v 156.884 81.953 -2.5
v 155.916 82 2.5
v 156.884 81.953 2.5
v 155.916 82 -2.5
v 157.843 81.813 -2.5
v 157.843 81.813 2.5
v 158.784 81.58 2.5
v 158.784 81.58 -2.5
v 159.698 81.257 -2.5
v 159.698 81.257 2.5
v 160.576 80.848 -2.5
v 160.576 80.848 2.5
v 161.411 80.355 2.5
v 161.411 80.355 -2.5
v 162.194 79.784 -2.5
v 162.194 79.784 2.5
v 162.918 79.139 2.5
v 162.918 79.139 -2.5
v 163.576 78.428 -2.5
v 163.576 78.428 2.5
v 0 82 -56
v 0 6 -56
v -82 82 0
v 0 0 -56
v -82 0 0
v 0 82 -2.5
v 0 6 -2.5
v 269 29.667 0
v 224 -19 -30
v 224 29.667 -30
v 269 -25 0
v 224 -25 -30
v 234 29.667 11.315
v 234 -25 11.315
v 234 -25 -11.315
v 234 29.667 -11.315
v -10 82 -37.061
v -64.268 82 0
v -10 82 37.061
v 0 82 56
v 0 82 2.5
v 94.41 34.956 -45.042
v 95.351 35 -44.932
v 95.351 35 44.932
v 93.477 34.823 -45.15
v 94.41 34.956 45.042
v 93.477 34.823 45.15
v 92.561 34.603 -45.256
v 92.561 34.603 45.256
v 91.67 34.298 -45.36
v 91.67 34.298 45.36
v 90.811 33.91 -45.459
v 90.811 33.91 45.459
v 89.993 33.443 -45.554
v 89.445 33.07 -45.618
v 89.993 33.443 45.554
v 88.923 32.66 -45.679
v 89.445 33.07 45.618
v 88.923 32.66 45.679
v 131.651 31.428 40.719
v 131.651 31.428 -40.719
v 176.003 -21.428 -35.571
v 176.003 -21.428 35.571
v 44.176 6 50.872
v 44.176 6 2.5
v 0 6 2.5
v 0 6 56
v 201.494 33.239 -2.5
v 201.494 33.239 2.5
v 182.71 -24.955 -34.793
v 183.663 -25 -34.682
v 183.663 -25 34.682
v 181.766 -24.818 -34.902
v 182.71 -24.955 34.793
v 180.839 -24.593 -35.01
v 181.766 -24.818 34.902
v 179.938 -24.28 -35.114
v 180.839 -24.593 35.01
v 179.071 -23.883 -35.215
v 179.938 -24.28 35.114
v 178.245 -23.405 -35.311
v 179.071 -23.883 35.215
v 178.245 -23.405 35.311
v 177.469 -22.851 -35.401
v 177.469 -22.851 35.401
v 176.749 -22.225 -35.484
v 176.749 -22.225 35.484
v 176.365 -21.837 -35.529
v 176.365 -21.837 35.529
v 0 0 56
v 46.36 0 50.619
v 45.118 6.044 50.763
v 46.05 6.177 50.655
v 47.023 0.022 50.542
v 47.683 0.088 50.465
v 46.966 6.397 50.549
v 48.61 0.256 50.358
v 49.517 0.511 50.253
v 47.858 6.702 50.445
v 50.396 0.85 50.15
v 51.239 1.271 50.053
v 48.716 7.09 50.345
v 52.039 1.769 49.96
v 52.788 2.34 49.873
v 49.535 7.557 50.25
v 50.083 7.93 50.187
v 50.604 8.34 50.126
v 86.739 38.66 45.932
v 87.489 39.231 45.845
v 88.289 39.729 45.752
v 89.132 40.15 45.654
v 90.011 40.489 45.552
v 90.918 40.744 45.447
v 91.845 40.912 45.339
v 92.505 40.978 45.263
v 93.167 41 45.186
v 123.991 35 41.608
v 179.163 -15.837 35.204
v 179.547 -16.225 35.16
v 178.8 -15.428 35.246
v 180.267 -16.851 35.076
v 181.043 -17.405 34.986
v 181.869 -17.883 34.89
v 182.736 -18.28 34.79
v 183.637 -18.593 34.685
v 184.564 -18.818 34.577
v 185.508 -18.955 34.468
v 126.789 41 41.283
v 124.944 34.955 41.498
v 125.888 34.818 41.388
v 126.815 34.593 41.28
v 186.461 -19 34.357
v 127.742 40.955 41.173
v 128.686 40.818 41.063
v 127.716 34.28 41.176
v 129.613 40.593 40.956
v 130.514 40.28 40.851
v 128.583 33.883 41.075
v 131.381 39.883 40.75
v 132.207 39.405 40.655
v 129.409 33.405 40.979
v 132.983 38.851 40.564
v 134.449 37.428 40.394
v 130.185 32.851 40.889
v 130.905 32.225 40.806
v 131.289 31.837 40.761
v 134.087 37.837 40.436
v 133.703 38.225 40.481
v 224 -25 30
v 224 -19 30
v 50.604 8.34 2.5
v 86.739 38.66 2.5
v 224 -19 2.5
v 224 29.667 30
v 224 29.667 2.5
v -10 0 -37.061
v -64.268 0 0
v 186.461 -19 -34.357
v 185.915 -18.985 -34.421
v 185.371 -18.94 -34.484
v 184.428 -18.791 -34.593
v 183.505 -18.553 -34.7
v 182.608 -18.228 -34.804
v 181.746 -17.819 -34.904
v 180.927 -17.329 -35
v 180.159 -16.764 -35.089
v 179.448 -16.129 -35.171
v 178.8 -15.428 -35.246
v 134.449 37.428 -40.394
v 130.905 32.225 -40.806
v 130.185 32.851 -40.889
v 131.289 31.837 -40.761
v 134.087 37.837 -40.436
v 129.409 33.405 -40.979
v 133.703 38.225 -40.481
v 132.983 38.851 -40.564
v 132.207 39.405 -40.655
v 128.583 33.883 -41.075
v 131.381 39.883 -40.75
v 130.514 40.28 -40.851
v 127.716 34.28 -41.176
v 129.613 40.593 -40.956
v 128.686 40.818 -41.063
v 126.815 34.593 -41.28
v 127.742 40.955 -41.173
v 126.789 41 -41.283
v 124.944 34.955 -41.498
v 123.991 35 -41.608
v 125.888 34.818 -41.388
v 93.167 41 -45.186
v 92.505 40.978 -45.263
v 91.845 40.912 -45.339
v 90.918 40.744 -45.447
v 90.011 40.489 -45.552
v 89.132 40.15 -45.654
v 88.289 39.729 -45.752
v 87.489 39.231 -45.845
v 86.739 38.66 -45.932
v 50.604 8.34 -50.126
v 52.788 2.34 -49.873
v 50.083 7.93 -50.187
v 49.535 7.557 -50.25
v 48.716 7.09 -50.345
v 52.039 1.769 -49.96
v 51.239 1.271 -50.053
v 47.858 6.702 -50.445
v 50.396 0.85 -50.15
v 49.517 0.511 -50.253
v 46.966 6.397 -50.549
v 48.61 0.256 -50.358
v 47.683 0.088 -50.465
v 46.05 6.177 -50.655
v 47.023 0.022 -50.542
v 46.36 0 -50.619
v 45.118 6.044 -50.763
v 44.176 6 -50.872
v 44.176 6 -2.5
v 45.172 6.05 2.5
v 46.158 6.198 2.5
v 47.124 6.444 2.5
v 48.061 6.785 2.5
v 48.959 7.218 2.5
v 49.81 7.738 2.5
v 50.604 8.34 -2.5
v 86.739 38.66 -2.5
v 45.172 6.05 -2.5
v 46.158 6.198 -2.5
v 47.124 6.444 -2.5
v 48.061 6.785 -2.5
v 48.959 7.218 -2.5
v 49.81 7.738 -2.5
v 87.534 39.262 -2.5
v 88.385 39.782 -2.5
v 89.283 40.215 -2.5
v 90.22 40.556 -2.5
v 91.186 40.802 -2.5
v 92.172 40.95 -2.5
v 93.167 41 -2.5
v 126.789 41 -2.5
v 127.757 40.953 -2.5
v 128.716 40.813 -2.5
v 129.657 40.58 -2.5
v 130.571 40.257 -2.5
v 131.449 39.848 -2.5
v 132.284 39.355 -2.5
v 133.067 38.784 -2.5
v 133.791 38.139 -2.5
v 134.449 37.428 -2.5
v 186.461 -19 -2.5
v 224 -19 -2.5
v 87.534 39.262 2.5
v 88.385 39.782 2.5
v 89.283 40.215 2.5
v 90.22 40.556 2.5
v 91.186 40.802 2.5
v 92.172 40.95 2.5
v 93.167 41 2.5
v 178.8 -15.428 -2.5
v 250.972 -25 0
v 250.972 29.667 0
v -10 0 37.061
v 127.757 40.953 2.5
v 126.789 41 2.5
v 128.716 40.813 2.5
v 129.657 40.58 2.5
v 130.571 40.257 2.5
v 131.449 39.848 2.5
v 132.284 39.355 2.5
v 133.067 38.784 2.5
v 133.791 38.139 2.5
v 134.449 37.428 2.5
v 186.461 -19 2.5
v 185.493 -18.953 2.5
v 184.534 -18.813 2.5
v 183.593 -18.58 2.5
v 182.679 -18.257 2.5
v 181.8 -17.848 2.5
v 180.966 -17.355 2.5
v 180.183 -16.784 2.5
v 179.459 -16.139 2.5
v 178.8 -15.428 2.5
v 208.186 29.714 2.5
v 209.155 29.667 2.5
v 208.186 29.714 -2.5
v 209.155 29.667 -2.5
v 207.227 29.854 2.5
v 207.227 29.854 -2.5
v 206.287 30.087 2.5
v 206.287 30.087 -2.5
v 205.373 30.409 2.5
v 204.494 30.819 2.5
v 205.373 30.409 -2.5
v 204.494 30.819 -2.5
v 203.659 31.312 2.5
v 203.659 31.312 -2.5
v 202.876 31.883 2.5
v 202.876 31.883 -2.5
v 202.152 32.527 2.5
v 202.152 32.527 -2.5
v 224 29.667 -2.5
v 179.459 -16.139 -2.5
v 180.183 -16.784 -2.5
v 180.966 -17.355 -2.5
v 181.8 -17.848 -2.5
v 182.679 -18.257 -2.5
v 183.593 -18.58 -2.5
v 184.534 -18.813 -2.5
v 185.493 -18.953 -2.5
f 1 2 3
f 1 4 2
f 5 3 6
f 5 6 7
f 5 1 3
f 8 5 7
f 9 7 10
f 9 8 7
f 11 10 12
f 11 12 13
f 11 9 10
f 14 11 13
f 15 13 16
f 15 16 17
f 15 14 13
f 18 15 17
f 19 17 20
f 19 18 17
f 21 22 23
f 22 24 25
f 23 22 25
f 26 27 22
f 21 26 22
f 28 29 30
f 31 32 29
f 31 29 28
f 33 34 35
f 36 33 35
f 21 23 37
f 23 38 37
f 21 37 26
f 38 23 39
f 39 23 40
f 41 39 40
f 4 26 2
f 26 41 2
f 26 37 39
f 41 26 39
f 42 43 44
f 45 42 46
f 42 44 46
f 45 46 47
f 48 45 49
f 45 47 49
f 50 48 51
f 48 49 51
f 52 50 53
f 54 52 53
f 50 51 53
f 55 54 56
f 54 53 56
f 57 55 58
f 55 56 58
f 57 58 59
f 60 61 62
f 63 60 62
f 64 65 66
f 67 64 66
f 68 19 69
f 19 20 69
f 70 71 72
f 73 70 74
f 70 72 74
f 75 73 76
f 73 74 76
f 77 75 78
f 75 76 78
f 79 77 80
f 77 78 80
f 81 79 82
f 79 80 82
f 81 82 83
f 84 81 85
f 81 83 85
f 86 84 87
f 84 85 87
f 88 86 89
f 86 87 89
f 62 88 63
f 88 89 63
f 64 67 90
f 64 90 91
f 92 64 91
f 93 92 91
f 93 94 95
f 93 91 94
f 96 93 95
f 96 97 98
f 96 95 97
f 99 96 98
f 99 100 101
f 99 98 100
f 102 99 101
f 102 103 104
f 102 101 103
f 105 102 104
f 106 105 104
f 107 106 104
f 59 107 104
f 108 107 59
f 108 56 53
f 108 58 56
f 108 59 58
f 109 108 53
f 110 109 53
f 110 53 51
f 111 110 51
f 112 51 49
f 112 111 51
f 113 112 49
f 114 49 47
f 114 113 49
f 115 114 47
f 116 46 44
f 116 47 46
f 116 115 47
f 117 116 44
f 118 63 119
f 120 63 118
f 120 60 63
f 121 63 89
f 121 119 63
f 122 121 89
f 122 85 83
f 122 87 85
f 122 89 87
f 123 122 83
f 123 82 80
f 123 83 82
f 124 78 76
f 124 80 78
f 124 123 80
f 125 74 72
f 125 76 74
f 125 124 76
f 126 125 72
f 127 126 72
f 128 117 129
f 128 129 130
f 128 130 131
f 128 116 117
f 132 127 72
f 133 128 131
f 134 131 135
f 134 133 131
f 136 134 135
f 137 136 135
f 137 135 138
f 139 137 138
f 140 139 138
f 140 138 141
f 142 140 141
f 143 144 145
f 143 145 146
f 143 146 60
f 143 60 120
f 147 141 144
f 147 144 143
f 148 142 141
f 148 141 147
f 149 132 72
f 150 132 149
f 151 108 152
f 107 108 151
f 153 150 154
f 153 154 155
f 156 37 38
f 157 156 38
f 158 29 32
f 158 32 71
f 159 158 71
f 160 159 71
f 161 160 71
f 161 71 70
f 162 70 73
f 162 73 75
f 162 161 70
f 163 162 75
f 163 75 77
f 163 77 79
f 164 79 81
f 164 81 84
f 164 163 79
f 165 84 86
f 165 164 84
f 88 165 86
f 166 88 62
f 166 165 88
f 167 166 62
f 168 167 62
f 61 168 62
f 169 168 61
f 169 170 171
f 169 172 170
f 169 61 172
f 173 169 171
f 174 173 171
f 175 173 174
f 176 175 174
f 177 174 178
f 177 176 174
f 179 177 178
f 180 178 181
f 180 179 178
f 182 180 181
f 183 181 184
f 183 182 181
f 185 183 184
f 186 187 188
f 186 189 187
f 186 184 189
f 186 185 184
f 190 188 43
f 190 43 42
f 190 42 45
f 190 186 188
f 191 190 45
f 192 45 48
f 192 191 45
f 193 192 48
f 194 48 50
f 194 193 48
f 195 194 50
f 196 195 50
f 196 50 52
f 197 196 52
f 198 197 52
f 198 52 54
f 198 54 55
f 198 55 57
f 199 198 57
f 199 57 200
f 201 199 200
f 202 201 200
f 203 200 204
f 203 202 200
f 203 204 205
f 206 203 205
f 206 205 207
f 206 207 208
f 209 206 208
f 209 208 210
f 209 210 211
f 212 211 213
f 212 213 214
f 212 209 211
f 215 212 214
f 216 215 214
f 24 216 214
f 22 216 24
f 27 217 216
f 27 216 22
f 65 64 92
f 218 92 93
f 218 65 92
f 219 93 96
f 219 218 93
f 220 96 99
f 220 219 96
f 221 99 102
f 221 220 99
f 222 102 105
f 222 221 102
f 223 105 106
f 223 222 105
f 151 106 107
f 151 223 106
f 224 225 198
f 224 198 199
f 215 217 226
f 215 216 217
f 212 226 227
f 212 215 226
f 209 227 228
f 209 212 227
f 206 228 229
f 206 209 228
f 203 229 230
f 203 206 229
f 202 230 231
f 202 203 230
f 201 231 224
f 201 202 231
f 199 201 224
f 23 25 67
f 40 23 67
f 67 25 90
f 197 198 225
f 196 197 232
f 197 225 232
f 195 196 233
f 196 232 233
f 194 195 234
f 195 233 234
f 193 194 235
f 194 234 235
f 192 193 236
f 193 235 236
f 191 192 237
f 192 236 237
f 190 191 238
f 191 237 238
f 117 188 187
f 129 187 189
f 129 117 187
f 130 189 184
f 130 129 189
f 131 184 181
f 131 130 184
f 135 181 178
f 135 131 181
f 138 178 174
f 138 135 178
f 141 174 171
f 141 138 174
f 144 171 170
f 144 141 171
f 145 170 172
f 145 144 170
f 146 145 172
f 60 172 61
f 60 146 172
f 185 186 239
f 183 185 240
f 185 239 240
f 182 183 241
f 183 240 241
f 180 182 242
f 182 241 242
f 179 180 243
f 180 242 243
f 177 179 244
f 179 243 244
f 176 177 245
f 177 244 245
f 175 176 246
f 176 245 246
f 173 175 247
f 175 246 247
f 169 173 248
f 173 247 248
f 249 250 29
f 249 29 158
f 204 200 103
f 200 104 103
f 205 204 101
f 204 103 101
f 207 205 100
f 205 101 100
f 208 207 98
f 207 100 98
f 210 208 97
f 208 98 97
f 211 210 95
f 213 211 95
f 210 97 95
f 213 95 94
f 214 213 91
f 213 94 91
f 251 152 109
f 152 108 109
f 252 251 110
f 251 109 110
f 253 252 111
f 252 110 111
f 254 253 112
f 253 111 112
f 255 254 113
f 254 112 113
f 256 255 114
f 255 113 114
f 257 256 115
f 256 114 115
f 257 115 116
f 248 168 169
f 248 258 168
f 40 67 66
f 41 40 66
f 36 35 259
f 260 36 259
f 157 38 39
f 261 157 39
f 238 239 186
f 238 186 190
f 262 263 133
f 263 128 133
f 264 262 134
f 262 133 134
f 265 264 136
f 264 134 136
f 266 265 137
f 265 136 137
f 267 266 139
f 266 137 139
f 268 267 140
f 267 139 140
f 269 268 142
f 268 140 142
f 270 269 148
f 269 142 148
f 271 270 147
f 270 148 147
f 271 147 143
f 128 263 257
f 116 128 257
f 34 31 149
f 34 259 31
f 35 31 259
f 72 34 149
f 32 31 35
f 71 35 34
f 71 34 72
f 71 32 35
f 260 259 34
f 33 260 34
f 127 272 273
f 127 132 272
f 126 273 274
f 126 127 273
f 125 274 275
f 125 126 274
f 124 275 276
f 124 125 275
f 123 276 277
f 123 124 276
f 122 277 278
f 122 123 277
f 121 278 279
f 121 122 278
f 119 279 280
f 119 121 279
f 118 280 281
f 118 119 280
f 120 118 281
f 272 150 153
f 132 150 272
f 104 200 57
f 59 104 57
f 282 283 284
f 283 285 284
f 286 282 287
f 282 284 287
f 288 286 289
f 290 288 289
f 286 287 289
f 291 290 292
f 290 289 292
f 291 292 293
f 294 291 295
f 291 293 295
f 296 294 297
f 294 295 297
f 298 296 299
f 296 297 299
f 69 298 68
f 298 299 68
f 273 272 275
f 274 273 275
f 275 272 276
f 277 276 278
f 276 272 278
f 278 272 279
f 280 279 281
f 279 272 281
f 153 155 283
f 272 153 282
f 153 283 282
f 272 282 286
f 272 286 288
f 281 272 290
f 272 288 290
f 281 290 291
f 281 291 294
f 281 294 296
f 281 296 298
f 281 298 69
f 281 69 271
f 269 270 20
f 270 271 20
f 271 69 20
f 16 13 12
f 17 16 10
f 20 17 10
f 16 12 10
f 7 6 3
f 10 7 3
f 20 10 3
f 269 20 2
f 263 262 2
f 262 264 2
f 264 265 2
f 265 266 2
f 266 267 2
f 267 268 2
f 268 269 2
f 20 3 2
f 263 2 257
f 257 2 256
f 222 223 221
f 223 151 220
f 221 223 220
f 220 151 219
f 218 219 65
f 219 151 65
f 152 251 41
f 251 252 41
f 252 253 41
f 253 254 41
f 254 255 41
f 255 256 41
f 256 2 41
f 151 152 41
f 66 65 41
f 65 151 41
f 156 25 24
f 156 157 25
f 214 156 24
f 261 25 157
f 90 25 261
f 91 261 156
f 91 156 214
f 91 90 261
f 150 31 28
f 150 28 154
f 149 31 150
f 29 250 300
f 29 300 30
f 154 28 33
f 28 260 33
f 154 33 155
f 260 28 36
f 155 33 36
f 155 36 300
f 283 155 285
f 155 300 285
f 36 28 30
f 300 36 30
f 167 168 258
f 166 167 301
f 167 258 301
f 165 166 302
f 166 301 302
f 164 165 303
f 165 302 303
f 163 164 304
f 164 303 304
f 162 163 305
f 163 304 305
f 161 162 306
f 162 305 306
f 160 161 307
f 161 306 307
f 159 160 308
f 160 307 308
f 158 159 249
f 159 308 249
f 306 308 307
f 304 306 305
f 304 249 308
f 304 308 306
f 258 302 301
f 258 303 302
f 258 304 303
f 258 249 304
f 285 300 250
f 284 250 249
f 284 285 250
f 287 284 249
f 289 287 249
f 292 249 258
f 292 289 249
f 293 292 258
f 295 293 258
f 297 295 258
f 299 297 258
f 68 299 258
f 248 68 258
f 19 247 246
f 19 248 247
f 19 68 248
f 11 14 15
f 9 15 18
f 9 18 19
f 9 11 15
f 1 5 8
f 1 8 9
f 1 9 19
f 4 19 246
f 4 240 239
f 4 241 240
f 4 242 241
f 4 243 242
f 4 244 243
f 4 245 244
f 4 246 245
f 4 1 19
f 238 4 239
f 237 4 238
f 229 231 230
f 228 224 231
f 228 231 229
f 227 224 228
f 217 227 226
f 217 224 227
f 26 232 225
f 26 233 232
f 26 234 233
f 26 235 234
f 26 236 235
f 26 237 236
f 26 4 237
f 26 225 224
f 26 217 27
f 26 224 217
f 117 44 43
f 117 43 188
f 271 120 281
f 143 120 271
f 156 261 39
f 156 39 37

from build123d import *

# Parameters (mm, degrees)
BOSS_EXTRUDE1_DEPTH     = 82
BOSS_EXTRUDE2_DEPTH     = 56
BOSS_EXTRUDE3_START     = -25
BOSS_EXTRUDE3_DEPTH     = 54.666666667
BOSS_EXTRUDE4_DEPTH     = 2.5
CUT_EXTRUDE2_DEPTH      = 83
CUT_EXTRUDE2_DEPTH_BACK = 26
FILLET1_R               = 10


with BuildPart() as part:
    # Sketch2 → Boss-Extrude1 (new body)
    with BuildSketch(Plane(origin=(0, 0, 0), x_dir=(1, 0, 0), z_dir=(0, 1, 0))):
        Polygon((0, -56), (0, 56), (-82, 0), align=None)
        Polygon((-10, 37.0612765), (-64.268297732, 0), (-10, -37.0612765), align=None, mode=Mode.SUBTRACT)
    extrude(amount=BOSS_EXTRUDE1_DEPTH)

    # Sketch3 → Boss-Extrude2 (add, symmetric)
    with BuildSketch(Plane.XY):
        Polygon((0, 0), (50, 0), (91.711375741, 35), (128.654022129, 35), (179, -25), (224, -25), (224, -19), (181.797845949, -19), (131.451868078, 41), (89.527554335, 41), (47.816178594, 6), (0, 6), align=None)
    extrude(amount=BOSS_EXTRUDE2_DEPTH, both=True)

    # Sketch4 → Boss-Extrude3 (add)
    with BuildSketch(Plane(origin=(0, 0, 0), x_dir=(1, 0, 0), z_dir=(0, 1, 0)).offset(BOSS_EXTRUDE3_START)):
        Polygon((224, -30), (224, 30), (269, 0), align=None)
        Polygon((234, 11.314829082), (250.972243623, 0), (234, -11.314829082), align=None, mode=Mode.SUBTRACT)
    extrude(amount=BOSS_EXTRUDE3_DEPTH)

    # Sketch7 → Boss-Extrude4 (add, symmetric)
    with BuildSketch(Plane.XY):
        Polygon((0, 82), (160.578604614, 82), (204.491485312, 29.666666667), (224, 29.666666667), (224, -19), (181.797845949, -19), (131.451868078, 41), (89.527554335, 41), (47.816178594, 6), (0, 6), align=None)
    extrude(amount=BOSS_EXTRUDE4_DEPTH, both=True)

    # Sketch8 → Cut-Extrude2 (cut, two sides)
    with BuildSketch(Plane(origin=(0, 0, 0), x_dir=(1, 0, 0), z_dir=(0, 1, 0))) as cut_extrude2_sk:
        Polygon((0, 56), (224, 56), (224, 30), align=None)
        Polygon((0, -56), (224, -30), (224, -56), align=None)
    extrude(amount=CUT_EXTRUDE2_DEPTH, mode=Mode.SUBTRACT)
    extrude(cut_extrude2_sk.sketch, amount=-CUT_EXTRUDE2_DEPTH_BACK, mode=Mode.SUBTRACT)

    # Fillet1
    fillet1_edges = [part.edges().sort_by_distance(p)[0] for p in [
        (47.816178594, 6, 26.474953921),
        (89.527554335, 41, 24.054204436),
        (131.451868078, 41, 21.621096942),
        (181.797845949, -19, 18.699232155),
        (179, -25, 0),
        (128.654022129, 35, 0),
        (91.711375741, 35, 0),
        (50, 0, 0),
        (47.816178594, 6, -26.474953921),
        (89.527554335, 41, -24.054204436),
        (131.451868078, 41, -21.621096942),
        (181.797845949, -19, -18.699232155),
        (204.491485312, 29.666666667, 0),
        (160.578604614, 82, 0),
    ]]
    fillet(fillet1_edges, radius=FILLET1_R)


solid = part.part
